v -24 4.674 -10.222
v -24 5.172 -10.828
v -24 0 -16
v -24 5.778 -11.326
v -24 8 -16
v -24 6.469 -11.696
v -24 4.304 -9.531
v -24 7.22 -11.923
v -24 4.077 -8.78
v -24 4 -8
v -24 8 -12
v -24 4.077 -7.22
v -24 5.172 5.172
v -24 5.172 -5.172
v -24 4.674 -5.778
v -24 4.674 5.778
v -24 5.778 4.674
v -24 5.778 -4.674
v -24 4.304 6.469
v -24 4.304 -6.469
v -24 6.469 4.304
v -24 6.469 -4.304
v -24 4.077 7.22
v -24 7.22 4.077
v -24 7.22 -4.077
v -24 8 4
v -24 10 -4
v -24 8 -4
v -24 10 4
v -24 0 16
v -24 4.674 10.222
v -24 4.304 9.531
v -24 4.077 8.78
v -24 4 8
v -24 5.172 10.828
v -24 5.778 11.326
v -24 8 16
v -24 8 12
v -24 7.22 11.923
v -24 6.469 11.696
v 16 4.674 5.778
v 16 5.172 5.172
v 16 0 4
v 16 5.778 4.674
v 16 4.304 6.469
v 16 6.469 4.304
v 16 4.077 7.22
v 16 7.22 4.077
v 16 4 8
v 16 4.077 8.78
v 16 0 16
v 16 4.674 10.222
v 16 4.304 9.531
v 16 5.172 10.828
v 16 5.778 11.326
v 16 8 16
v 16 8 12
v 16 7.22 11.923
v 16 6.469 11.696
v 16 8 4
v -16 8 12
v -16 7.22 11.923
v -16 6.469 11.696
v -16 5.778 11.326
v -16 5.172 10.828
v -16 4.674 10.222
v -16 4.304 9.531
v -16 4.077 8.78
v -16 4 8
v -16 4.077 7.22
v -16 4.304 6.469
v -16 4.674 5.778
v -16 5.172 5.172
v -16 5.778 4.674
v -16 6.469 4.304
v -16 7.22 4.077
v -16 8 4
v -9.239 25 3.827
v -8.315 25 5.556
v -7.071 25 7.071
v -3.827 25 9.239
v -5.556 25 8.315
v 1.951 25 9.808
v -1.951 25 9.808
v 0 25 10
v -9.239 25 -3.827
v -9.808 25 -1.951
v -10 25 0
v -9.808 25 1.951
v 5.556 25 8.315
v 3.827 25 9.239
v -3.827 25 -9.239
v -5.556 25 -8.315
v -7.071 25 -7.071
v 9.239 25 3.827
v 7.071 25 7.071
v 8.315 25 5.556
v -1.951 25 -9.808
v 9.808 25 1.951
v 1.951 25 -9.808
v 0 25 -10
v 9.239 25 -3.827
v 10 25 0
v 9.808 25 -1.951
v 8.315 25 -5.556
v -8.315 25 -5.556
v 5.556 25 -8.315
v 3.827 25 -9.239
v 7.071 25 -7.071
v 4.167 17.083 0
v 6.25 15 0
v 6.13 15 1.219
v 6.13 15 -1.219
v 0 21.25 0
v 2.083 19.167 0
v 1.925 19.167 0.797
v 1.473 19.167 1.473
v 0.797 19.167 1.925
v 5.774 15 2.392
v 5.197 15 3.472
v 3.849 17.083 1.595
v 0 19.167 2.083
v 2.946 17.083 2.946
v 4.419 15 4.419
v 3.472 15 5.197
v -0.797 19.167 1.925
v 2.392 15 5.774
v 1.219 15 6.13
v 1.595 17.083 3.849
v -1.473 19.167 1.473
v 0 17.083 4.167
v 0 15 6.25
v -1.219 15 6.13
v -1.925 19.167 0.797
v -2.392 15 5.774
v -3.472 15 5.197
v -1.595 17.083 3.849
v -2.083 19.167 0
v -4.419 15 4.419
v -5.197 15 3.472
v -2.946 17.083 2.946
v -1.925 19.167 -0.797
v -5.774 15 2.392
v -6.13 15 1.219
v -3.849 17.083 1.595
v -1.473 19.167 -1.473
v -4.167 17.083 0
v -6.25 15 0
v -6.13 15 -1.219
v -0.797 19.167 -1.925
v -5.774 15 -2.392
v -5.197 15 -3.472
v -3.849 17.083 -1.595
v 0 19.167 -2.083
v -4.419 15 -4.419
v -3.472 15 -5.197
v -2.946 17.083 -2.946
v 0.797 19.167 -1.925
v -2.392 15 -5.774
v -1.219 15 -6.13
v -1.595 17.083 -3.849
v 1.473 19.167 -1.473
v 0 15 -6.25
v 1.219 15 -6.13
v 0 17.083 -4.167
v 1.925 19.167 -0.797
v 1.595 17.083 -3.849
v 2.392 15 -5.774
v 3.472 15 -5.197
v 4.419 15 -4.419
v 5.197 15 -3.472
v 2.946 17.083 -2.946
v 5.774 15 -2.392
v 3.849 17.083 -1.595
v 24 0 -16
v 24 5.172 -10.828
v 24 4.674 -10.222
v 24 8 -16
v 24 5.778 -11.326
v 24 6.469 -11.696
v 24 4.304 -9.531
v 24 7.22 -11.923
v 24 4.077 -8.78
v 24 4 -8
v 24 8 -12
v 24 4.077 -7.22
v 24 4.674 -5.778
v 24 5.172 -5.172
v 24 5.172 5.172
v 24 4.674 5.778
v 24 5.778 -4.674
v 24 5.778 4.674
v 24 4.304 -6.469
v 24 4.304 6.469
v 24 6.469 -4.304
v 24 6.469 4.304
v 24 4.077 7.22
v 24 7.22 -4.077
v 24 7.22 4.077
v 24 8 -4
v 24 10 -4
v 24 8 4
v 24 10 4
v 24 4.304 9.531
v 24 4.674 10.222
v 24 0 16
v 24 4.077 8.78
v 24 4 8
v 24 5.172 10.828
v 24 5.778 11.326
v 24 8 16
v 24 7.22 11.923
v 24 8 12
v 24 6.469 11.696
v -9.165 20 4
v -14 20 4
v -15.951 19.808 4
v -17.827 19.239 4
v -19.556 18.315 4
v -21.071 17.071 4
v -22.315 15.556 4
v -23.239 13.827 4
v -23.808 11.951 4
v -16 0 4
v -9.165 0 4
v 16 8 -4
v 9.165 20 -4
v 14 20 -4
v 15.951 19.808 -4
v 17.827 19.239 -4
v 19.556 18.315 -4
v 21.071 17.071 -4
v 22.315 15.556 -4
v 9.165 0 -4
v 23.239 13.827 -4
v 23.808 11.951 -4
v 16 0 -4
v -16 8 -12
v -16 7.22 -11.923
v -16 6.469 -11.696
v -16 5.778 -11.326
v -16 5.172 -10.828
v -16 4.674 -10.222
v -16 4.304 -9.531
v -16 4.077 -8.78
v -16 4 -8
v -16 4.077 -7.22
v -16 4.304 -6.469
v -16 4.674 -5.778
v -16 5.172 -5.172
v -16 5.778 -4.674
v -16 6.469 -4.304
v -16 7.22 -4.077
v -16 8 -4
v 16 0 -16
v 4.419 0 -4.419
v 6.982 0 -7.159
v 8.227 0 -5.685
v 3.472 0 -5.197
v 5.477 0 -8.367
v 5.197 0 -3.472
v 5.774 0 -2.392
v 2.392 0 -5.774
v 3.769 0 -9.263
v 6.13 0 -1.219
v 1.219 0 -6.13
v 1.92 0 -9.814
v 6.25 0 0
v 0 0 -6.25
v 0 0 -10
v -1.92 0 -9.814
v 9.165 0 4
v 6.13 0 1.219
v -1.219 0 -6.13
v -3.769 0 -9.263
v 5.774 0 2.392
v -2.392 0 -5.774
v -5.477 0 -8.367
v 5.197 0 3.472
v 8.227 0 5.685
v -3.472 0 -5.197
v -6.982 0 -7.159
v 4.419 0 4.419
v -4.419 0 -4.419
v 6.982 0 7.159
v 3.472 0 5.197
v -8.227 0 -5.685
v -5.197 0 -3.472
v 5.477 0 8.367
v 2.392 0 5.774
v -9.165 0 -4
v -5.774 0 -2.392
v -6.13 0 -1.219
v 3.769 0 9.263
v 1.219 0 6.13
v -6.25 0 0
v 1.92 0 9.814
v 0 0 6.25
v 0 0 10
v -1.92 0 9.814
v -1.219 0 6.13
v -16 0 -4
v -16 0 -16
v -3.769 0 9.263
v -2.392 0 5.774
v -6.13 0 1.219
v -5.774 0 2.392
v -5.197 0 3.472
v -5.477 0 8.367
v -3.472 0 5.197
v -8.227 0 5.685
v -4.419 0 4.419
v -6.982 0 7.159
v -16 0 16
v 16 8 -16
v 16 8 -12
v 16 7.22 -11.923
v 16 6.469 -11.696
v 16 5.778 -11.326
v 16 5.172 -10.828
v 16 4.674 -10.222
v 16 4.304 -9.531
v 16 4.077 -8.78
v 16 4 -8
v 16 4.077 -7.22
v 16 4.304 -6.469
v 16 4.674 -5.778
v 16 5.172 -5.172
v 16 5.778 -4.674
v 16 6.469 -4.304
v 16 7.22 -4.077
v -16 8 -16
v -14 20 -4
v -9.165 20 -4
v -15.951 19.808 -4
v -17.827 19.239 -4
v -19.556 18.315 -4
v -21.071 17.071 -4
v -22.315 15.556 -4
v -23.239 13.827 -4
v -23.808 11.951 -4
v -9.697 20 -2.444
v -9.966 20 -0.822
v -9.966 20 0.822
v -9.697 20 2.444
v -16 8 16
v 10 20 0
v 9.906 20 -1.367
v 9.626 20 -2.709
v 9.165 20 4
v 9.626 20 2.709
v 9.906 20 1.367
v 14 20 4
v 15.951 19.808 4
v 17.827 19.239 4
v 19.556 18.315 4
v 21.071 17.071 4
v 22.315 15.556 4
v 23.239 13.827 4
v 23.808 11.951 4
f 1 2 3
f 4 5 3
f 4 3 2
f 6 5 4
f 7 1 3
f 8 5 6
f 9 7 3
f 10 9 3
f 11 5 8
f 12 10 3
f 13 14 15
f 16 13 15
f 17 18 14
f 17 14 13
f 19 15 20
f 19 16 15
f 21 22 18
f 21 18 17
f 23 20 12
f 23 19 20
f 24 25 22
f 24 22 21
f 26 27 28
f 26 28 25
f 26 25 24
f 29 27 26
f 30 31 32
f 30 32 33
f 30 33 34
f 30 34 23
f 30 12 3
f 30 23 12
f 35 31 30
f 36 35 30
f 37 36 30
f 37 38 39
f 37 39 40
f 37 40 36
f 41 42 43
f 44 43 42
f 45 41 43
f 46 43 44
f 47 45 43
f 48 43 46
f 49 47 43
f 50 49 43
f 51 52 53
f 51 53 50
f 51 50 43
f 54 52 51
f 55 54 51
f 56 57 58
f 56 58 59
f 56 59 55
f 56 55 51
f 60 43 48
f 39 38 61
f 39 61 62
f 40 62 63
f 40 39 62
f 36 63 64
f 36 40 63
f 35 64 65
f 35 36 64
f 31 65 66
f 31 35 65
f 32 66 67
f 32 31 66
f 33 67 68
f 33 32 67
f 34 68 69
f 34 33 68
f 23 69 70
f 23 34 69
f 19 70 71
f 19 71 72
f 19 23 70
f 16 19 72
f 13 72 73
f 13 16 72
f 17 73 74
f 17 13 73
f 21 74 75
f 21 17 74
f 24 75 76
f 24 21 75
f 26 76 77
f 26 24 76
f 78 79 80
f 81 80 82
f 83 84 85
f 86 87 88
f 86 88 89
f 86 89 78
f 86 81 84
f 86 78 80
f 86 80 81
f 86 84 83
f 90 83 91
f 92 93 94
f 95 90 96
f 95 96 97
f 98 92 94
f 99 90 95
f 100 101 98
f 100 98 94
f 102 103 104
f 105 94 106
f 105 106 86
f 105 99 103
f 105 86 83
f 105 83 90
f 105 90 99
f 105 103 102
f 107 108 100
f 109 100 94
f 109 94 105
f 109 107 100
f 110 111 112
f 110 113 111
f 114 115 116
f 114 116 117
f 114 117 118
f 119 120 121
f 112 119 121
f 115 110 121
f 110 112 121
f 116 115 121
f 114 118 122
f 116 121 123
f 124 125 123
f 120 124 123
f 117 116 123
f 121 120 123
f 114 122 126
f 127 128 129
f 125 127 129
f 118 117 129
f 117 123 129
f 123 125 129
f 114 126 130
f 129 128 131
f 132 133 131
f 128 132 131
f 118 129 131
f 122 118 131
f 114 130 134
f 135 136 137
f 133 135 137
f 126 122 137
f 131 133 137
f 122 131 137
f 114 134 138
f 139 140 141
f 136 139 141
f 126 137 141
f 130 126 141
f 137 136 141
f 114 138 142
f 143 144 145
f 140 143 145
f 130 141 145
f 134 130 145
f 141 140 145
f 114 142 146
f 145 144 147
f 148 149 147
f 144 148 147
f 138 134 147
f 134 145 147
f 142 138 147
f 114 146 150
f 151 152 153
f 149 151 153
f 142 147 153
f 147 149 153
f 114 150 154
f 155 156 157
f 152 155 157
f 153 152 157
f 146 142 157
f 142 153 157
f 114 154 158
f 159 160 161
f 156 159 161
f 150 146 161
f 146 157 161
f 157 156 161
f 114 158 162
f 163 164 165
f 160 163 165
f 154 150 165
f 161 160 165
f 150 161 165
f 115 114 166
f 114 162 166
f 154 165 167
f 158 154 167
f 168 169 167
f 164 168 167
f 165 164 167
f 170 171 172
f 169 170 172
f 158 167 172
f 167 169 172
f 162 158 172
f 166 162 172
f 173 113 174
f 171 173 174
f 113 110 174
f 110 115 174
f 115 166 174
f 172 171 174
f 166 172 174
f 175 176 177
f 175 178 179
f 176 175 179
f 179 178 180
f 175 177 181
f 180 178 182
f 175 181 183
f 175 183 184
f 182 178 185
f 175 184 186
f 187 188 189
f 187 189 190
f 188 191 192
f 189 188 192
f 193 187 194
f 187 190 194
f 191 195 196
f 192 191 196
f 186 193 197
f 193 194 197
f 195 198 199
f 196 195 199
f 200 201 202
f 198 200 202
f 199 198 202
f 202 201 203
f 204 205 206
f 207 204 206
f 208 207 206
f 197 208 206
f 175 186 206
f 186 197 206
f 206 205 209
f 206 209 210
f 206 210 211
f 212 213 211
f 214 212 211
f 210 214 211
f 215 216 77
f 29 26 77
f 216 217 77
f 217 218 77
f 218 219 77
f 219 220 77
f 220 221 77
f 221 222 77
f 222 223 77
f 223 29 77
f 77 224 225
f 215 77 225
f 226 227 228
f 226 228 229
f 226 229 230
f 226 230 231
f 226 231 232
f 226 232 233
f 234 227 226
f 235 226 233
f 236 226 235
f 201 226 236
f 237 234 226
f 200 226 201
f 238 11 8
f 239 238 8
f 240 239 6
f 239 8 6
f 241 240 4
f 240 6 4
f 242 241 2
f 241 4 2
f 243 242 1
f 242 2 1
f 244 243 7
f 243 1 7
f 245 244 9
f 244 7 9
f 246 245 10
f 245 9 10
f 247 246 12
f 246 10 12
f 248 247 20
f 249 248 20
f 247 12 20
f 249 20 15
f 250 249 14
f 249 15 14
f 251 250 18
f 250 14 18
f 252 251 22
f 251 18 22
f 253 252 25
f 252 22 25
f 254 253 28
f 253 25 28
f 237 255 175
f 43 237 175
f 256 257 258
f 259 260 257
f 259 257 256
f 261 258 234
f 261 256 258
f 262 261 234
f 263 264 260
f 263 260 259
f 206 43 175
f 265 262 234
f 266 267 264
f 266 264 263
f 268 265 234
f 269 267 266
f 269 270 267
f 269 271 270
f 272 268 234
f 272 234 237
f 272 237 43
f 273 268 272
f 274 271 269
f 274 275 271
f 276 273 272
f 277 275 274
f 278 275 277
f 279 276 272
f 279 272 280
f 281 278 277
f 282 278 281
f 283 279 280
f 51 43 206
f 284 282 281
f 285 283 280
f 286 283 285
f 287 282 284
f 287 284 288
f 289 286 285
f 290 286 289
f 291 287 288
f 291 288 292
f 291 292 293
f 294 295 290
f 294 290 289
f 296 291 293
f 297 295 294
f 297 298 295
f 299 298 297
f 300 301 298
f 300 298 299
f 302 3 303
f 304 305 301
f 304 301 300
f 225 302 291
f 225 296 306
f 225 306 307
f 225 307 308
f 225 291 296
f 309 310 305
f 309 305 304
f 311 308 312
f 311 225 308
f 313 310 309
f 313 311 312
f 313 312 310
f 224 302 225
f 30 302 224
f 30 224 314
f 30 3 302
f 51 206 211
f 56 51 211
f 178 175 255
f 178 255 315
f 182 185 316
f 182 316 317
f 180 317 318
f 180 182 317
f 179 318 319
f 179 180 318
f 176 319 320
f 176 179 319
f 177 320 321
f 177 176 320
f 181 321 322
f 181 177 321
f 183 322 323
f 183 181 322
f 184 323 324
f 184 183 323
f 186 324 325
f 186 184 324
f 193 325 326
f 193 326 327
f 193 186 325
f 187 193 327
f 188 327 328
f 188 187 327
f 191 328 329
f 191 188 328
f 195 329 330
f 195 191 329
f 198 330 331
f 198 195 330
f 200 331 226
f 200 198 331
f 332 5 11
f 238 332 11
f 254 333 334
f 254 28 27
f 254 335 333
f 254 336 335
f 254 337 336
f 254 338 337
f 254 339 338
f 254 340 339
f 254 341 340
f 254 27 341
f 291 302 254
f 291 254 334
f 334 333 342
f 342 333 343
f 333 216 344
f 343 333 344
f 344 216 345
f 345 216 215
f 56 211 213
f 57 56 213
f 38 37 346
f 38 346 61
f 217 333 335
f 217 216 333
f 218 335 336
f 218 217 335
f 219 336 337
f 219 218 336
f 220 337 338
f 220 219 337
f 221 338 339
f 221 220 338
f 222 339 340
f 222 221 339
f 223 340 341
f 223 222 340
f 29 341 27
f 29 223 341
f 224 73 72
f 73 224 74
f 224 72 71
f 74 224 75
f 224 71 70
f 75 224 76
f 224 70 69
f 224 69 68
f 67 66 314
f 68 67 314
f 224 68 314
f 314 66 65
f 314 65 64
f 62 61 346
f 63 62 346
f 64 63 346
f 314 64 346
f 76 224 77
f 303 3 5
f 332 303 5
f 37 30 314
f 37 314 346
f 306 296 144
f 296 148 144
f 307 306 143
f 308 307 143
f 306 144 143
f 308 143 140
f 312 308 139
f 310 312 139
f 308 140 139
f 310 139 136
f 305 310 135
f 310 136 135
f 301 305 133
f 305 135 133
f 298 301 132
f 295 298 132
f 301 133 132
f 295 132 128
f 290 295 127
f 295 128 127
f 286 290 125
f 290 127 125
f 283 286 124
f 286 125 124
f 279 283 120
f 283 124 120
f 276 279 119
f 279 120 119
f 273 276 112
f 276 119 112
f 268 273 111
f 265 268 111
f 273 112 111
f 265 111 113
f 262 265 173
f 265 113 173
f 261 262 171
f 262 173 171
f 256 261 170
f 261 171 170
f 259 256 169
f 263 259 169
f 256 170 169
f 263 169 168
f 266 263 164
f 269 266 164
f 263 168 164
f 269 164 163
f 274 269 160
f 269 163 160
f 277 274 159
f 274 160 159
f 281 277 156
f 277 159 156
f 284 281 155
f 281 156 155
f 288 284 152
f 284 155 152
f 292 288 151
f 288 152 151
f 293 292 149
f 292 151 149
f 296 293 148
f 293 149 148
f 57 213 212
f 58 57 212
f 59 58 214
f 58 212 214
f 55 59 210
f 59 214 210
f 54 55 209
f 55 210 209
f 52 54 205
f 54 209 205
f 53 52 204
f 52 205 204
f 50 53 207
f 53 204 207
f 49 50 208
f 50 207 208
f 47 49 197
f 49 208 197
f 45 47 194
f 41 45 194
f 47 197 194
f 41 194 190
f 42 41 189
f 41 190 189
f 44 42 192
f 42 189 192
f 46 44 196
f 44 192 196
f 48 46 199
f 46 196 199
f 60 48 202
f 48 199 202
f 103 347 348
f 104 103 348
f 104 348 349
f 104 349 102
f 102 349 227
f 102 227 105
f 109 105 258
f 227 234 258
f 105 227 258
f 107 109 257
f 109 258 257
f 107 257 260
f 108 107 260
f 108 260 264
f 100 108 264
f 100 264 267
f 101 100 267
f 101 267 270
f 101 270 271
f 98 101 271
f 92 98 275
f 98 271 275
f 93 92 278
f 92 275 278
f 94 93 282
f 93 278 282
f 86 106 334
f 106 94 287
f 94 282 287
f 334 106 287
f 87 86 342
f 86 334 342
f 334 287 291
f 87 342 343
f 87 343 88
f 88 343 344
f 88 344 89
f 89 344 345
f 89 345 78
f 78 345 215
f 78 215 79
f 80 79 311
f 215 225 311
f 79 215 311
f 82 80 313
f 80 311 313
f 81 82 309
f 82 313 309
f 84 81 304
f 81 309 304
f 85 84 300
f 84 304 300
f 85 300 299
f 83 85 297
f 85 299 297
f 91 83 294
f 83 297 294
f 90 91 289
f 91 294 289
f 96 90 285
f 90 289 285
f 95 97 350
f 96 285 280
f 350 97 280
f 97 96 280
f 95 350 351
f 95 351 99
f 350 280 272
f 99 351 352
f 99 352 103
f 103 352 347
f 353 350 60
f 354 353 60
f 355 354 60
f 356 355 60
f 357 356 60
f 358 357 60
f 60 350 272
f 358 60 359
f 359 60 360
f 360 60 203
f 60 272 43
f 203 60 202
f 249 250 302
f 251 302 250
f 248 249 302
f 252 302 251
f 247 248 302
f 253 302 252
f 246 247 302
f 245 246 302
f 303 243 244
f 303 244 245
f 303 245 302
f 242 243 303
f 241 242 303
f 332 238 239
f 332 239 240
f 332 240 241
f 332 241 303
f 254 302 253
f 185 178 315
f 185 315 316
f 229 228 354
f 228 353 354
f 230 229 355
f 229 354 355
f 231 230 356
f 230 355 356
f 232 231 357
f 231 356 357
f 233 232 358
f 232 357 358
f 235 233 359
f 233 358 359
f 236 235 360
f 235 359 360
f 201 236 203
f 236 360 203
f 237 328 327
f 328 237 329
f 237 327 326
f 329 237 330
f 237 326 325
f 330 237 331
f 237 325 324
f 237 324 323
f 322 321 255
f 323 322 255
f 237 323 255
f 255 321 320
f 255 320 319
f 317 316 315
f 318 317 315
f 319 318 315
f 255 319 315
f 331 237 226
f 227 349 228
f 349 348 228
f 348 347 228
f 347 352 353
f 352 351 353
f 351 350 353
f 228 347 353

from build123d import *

# Parameters (mm, degrees)
SKETCH1_R                = 10
PEN_CAP_DEPTH            = 25
SKETCH2_W                = 48
SKETCH2_H                = 8
HOOK_STRUCTURE_DEPTH     = 20
PEN_CENTERING_HOLE_D     = 12.5
PEN_CENTERING_HOLE_DEPTH = 15
PEN_CENTERING_HOLE_TIP   = 6.25
HOOKS_DEPTH              = 8
CORNER_DEC_R             = 10


with BuildPart() as part:
    # Sketch1 → Pen Cap (new body)
    with BuildSketch(Plane(origin=(0, 0, 0), x_dir=(1, 0, 0), z_dir=(0, 1, 0))):
        Circle(SKETCH1_R)
    extrude(amount=PEN_CAP_DEPTH)

    # Sketch2 → Hook Structure (add)
    with BuildSketch(Plane.XZ):
        Rectangle(SKETCH2_W, SKETCH2_H)
    extrude(amount=-HOOK_STRUCTURE_DEPTH)

    # Pen Centering Hole
    with Locations(Plane.XZ):
        with Locations((0, 0)):
            Hole(PEN_CENTERING_HOLE_D / 2, depth=PEN_CENTERING_HOLE_DEPTH)
            with Locations((0, 0, -(PEN_CENTERING_HOLE_DEPTH + PEN_CENTERING_HOLE_TIP / 2))):  # 90° drill point
                Cone(0, PEN_CENTERING_HOLE_D / 2, PEN_CENTERING_HOLE_TIP, mode=Mode.SUBTRACT)

    # Sketch6 → Hooks (add)
    with BuildSketch(Plane(origin=(24, 0, 0), x_dir=(0, 0, -1), z_dir=(1, 0, 0))):
        with BuildLine():
            Line((-4, 0), (-16, 0))
            Line((-16, 0), (-16, 8))
            Line((-16, 8), (-12, 8))
            ThreePointArc((-12, 8), (-8, 4), (-4, 8))
            Line((-4, 8), (-4, 0))
        make_face()
        with BuildLine():
            Line((4, 8), (4, 0))
            Line((4, 0), (16, 0))
            Line((16, 0), (16, 8))
            Line((16, 8), (12, 8))
            ThreePointArc((12, 8), (8, 4), (4, 8))
        make_face()
    hooks = extrude(amount=-HOOKS_DEPTH)

    # Hook Mirror: Hooks across plane
    add(hooks.mirror(Plane(origin=(0, 0, 0), x_dir=(0, 0, 1), z_dir=(1, 0, 0))))

    # Corner Dec
    corner_dec_edges = [part.edges().sort_by_distance(p)[0] for p in [
        (-24, 20, 0),
        (24, 20, 0),
    ]]
    fillet(corner_dec_edges, radius=CORNER_DEC_R)


solid = part.part
